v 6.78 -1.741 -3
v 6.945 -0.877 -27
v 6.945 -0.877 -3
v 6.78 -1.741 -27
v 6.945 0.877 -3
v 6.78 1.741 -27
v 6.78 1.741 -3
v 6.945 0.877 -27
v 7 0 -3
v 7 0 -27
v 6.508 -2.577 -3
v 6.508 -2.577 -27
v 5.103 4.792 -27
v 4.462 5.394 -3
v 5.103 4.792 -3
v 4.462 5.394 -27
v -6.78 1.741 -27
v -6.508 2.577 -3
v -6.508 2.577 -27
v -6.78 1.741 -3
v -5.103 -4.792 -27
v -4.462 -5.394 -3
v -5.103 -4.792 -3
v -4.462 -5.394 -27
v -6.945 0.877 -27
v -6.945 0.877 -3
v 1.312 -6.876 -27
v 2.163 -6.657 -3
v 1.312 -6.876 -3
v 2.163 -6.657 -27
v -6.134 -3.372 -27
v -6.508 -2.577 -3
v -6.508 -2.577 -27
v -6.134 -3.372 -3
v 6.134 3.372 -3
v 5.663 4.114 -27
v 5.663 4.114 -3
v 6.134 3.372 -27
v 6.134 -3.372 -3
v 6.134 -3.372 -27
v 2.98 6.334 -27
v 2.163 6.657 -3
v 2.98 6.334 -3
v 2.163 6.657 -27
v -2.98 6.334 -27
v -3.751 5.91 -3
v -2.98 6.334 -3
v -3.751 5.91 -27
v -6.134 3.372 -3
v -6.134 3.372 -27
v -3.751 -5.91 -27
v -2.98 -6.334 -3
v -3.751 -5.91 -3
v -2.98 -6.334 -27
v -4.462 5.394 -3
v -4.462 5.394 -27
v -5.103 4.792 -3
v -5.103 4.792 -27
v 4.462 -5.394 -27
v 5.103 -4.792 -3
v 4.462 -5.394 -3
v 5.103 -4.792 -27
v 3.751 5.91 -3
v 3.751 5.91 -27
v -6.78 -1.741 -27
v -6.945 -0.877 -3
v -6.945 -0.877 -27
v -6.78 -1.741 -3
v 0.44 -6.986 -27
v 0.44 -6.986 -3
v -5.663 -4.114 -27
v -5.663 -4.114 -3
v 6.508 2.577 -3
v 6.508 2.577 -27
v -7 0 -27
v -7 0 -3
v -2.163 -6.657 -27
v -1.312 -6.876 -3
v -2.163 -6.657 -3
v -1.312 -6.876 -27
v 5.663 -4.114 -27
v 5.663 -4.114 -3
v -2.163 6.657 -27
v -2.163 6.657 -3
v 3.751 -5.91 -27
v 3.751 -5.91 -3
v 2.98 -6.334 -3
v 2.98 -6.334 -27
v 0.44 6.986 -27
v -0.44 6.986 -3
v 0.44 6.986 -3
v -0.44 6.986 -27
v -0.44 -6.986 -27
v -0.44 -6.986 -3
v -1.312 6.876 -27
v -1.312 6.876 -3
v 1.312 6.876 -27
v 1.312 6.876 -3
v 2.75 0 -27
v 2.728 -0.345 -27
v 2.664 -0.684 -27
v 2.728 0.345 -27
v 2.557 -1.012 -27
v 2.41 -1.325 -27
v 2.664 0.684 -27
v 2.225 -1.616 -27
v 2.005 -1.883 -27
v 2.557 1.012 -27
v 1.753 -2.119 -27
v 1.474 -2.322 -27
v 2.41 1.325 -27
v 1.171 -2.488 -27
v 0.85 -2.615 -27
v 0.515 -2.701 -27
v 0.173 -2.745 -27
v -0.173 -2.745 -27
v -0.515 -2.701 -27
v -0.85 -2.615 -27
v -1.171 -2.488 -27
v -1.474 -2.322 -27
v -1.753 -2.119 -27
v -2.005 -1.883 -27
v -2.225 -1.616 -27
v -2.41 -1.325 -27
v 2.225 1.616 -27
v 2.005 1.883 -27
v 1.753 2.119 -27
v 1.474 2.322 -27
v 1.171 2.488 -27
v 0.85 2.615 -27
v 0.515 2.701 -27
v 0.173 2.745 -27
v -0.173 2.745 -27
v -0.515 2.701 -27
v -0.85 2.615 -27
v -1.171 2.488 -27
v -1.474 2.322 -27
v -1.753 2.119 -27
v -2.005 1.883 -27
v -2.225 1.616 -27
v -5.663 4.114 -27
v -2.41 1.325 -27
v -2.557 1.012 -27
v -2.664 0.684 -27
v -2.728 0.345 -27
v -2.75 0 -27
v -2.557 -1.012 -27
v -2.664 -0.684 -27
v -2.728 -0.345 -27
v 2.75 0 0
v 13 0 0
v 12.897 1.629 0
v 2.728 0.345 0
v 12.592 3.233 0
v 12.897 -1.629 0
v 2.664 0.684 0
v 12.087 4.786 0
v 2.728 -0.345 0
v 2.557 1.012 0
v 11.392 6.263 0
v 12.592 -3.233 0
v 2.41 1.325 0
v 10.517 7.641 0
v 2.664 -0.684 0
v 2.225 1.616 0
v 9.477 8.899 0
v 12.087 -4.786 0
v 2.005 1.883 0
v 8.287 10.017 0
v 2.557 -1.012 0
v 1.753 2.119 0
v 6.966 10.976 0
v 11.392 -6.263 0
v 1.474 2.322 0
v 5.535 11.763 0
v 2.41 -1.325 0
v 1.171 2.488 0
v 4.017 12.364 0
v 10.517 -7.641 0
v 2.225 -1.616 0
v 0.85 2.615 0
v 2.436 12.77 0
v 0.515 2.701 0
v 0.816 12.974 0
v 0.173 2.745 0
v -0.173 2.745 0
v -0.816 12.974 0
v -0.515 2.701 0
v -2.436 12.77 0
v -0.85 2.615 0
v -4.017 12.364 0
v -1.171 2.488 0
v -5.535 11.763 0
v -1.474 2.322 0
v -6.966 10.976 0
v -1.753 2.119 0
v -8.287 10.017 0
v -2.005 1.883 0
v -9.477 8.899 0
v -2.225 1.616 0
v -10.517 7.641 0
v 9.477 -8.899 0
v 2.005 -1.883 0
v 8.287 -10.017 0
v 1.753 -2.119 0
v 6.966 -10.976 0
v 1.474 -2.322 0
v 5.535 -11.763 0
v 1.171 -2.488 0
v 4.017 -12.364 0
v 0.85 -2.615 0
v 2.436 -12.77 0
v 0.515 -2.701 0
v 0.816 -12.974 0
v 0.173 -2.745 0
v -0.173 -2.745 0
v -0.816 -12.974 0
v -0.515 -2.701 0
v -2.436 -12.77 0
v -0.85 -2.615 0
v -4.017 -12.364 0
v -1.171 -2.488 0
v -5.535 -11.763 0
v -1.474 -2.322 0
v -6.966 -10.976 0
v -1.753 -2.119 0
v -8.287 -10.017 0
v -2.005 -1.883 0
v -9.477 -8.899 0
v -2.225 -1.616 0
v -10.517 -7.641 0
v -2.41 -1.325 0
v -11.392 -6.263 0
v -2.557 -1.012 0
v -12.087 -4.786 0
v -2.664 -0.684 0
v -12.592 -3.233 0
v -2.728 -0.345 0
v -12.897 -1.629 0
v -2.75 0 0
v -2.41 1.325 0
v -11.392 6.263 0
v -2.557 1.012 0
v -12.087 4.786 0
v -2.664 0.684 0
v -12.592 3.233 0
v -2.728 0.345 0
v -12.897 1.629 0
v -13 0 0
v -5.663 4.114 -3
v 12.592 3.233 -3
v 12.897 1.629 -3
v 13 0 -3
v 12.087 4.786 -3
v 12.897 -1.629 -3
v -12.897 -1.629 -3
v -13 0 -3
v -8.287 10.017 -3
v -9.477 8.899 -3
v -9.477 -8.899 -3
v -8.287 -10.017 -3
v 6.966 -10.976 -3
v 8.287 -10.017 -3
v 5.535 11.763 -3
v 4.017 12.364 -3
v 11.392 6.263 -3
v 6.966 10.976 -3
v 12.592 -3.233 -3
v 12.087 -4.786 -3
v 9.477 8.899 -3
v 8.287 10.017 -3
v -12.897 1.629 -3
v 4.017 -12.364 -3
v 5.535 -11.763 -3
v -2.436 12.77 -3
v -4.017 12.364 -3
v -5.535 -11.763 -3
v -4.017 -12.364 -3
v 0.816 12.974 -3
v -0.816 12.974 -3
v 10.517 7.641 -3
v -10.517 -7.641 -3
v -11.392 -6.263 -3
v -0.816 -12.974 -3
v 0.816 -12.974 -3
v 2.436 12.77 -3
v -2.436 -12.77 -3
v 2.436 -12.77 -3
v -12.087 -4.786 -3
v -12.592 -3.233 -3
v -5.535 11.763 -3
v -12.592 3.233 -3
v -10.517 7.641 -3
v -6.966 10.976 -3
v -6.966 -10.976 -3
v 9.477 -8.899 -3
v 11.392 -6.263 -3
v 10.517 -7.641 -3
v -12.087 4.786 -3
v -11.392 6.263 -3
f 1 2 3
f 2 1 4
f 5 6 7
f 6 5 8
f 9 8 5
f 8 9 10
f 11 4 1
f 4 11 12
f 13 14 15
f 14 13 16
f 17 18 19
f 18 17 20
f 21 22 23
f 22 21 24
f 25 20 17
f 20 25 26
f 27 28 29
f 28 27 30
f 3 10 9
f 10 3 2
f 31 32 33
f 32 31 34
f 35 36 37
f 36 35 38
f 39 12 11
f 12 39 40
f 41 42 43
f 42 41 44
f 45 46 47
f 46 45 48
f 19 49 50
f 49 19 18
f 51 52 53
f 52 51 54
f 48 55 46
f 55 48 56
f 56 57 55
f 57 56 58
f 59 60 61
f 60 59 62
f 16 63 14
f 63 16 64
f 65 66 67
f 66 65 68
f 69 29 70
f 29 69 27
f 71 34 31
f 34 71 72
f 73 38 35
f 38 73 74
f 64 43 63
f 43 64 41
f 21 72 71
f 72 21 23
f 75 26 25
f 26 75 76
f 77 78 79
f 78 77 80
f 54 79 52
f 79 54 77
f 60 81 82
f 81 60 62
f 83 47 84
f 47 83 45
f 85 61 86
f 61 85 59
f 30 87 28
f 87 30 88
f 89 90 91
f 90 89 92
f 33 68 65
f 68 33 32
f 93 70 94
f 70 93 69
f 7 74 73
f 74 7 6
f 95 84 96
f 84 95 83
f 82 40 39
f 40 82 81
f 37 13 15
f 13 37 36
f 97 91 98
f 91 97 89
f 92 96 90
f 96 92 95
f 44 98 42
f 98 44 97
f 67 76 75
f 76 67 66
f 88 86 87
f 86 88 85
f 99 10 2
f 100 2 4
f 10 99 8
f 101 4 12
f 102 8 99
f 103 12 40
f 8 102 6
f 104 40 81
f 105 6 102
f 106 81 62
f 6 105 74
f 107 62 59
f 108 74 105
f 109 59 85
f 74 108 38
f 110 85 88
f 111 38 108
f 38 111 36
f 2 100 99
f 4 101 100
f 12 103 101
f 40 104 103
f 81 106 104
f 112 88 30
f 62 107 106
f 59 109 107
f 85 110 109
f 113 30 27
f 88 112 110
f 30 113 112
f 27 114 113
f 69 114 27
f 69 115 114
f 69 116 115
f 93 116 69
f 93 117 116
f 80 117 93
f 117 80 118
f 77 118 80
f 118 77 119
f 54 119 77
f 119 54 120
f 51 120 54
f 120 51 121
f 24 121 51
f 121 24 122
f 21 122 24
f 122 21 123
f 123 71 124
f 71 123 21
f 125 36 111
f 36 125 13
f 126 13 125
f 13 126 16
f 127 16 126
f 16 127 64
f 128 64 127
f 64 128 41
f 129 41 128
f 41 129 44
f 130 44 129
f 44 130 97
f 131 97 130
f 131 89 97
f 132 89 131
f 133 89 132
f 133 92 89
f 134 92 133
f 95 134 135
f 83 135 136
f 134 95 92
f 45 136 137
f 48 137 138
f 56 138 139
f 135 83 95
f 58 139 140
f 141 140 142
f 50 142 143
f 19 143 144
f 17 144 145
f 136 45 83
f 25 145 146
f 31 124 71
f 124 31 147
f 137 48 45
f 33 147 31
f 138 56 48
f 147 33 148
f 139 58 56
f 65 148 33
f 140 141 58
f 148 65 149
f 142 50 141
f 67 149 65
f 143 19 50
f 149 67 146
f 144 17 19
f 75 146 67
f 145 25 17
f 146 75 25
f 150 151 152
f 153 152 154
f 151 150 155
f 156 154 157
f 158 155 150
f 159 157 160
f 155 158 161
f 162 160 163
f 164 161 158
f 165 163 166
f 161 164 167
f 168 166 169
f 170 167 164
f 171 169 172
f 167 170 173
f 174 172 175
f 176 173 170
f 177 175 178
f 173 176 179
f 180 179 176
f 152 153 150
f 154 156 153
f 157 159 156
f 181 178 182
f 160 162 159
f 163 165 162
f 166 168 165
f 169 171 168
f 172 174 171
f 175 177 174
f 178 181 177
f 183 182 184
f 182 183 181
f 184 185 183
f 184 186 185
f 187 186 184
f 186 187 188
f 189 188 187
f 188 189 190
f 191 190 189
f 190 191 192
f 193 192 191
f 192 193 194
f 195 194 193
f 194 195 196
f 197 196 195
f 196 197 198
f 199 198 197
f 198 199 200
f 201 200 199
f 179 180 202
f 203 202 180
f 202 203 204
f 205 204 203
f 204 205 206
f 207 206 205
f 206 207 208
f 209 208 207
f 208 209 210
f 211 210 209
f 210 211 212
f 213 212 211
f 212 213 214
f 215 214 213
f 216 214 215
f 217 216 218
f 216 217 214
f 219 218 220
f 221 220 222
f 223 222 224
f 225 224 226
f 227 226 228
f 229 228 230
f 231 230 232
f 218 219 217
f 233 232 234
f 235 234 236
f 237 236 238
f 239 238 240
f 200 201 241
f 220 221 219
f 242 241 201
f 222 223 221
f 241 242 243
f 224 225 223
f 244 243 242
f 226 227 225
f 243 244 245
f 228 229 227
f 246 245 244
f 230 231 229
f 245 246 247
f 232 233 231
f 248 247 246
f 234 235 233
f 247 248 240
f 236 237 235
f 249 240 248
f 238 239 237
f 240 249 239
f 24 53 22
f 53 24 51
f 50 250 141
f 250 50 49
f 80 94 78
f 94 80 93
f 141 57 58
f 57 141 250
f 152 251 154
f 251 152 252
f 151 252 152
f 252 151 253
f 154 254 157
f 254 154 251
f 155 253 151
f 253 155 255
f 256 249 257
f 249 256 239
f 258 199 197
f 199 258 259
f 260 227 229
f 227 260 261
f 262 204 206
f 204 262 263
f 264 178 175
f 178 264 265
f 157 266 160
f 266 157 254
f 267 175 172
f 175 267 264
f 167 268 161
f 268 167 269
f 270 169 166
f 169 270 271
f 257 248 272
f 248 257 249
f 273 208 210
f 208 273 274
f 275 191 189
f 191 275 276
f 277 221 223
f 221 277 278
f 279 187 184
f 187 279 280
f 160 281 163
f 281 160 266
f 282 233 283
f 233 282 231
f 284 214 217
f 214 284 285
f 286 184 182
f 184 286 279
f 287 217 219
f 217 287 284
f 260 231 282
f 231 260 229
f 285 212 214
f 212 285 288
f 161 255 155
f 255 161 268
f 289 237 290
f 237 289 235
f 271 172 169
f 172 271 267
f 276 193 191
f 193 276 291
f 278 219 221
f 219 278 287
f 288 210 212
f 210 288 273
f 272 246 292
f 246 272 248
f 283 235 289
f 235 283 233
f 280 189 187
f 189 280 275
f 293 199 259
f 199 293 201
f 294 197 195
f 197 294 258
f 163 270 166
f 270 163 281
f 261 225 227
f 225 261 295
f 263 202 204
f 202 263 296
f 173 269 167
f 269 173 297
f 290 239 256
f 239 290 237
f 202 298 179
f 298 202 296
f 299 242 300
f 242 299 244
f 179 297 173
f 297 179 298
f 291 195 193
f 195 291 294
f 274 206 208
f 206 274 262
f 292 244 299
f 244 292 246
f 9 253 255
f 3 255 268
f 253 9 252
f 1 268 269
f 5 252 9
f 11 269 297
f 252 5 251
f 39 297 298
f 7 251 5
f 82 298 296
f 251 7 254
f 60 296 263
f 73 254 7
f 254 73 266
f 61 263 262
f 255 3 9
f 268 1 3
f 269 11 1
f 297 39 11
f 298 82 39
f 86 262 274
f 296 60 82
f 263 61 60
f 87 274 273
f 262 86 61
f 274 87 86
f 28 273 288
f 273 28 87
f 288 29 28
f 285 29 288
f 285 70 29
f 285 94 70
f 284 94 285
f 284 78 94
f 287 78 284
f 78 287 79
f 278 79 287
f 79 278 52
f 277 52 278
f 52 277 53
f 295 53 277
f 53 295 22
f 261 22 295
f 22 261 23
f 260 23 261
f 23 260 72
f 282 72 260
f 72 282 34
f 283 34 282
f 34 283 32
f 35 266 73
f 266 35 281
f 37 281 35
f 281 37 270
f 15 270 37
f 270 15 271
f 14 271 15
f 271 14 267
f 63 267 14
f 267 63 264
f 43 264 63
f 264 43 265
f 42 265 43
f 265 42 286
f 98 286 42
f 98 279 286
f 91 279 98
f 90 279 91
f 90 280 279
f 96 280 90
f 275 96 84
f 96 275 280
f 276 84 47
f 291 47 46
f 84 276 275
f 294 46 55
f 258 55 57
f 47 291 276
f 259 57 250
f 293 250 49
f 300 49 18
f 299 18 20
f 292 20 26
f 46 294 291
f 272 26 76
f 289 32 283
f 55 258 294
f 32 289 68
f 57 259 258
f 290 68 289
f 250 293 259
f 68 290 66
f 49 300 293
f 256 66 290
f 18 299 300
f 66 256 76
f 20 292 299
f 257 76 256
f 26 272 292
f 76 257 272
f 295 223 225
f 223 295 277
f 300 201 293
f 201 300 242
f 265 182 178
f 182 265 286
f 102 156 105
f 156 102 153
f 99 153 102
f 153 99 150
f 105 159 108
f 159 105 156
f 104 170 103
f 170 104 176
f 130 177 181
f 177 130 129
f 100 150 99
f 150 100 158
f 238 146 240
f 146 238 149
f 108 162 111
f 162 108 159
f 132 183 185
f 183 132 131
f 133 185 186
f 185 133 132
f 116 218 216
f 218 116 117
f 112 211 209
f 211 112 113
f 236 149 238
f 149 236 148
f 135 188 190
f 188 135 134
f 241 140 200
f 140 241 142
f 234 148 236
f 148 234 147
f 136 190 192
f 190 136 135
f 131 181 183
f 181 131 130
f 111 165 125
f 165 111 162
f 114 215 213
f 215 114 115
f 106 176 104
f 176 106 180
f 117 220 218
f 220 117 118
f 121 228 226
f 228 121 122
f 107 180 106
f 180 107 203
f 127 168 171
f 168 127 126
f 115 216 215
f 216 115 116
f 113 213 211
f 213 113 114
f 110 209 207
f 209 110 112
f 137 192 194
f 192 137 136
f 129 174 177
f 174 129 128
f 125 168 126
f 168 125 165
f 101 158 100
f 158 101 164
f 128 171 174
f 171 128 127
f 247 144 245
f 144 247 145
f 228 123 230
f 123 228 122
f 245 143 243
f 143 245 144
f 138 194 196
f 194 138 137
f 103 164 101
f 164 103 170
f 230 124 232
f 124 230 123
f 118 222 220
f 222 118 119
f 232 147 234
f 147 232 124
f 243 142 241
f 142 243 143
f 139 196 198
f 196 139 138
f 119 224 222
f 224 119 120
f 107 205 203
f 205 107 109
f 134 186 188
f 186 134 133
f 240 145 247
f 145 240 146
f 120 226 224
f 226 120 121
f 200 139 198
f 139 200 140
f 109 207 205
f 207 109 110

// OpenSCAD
$fn = 50;


difference() {
	union() {
		translate(v = [0, 0, -27.0000000000]) {
			cylinder(h = 27, r = 7.0000000000);
		}
		translate(v = [0, 0, -3.0000000000]) {
			cylinder(h = 3, r = 13.0000000000);
		}
	}
	union() {
		#translate(v = [0, 0, -27]) {
			cylinder(h = 27, r = 2.7500000000);
		}
	}
}
